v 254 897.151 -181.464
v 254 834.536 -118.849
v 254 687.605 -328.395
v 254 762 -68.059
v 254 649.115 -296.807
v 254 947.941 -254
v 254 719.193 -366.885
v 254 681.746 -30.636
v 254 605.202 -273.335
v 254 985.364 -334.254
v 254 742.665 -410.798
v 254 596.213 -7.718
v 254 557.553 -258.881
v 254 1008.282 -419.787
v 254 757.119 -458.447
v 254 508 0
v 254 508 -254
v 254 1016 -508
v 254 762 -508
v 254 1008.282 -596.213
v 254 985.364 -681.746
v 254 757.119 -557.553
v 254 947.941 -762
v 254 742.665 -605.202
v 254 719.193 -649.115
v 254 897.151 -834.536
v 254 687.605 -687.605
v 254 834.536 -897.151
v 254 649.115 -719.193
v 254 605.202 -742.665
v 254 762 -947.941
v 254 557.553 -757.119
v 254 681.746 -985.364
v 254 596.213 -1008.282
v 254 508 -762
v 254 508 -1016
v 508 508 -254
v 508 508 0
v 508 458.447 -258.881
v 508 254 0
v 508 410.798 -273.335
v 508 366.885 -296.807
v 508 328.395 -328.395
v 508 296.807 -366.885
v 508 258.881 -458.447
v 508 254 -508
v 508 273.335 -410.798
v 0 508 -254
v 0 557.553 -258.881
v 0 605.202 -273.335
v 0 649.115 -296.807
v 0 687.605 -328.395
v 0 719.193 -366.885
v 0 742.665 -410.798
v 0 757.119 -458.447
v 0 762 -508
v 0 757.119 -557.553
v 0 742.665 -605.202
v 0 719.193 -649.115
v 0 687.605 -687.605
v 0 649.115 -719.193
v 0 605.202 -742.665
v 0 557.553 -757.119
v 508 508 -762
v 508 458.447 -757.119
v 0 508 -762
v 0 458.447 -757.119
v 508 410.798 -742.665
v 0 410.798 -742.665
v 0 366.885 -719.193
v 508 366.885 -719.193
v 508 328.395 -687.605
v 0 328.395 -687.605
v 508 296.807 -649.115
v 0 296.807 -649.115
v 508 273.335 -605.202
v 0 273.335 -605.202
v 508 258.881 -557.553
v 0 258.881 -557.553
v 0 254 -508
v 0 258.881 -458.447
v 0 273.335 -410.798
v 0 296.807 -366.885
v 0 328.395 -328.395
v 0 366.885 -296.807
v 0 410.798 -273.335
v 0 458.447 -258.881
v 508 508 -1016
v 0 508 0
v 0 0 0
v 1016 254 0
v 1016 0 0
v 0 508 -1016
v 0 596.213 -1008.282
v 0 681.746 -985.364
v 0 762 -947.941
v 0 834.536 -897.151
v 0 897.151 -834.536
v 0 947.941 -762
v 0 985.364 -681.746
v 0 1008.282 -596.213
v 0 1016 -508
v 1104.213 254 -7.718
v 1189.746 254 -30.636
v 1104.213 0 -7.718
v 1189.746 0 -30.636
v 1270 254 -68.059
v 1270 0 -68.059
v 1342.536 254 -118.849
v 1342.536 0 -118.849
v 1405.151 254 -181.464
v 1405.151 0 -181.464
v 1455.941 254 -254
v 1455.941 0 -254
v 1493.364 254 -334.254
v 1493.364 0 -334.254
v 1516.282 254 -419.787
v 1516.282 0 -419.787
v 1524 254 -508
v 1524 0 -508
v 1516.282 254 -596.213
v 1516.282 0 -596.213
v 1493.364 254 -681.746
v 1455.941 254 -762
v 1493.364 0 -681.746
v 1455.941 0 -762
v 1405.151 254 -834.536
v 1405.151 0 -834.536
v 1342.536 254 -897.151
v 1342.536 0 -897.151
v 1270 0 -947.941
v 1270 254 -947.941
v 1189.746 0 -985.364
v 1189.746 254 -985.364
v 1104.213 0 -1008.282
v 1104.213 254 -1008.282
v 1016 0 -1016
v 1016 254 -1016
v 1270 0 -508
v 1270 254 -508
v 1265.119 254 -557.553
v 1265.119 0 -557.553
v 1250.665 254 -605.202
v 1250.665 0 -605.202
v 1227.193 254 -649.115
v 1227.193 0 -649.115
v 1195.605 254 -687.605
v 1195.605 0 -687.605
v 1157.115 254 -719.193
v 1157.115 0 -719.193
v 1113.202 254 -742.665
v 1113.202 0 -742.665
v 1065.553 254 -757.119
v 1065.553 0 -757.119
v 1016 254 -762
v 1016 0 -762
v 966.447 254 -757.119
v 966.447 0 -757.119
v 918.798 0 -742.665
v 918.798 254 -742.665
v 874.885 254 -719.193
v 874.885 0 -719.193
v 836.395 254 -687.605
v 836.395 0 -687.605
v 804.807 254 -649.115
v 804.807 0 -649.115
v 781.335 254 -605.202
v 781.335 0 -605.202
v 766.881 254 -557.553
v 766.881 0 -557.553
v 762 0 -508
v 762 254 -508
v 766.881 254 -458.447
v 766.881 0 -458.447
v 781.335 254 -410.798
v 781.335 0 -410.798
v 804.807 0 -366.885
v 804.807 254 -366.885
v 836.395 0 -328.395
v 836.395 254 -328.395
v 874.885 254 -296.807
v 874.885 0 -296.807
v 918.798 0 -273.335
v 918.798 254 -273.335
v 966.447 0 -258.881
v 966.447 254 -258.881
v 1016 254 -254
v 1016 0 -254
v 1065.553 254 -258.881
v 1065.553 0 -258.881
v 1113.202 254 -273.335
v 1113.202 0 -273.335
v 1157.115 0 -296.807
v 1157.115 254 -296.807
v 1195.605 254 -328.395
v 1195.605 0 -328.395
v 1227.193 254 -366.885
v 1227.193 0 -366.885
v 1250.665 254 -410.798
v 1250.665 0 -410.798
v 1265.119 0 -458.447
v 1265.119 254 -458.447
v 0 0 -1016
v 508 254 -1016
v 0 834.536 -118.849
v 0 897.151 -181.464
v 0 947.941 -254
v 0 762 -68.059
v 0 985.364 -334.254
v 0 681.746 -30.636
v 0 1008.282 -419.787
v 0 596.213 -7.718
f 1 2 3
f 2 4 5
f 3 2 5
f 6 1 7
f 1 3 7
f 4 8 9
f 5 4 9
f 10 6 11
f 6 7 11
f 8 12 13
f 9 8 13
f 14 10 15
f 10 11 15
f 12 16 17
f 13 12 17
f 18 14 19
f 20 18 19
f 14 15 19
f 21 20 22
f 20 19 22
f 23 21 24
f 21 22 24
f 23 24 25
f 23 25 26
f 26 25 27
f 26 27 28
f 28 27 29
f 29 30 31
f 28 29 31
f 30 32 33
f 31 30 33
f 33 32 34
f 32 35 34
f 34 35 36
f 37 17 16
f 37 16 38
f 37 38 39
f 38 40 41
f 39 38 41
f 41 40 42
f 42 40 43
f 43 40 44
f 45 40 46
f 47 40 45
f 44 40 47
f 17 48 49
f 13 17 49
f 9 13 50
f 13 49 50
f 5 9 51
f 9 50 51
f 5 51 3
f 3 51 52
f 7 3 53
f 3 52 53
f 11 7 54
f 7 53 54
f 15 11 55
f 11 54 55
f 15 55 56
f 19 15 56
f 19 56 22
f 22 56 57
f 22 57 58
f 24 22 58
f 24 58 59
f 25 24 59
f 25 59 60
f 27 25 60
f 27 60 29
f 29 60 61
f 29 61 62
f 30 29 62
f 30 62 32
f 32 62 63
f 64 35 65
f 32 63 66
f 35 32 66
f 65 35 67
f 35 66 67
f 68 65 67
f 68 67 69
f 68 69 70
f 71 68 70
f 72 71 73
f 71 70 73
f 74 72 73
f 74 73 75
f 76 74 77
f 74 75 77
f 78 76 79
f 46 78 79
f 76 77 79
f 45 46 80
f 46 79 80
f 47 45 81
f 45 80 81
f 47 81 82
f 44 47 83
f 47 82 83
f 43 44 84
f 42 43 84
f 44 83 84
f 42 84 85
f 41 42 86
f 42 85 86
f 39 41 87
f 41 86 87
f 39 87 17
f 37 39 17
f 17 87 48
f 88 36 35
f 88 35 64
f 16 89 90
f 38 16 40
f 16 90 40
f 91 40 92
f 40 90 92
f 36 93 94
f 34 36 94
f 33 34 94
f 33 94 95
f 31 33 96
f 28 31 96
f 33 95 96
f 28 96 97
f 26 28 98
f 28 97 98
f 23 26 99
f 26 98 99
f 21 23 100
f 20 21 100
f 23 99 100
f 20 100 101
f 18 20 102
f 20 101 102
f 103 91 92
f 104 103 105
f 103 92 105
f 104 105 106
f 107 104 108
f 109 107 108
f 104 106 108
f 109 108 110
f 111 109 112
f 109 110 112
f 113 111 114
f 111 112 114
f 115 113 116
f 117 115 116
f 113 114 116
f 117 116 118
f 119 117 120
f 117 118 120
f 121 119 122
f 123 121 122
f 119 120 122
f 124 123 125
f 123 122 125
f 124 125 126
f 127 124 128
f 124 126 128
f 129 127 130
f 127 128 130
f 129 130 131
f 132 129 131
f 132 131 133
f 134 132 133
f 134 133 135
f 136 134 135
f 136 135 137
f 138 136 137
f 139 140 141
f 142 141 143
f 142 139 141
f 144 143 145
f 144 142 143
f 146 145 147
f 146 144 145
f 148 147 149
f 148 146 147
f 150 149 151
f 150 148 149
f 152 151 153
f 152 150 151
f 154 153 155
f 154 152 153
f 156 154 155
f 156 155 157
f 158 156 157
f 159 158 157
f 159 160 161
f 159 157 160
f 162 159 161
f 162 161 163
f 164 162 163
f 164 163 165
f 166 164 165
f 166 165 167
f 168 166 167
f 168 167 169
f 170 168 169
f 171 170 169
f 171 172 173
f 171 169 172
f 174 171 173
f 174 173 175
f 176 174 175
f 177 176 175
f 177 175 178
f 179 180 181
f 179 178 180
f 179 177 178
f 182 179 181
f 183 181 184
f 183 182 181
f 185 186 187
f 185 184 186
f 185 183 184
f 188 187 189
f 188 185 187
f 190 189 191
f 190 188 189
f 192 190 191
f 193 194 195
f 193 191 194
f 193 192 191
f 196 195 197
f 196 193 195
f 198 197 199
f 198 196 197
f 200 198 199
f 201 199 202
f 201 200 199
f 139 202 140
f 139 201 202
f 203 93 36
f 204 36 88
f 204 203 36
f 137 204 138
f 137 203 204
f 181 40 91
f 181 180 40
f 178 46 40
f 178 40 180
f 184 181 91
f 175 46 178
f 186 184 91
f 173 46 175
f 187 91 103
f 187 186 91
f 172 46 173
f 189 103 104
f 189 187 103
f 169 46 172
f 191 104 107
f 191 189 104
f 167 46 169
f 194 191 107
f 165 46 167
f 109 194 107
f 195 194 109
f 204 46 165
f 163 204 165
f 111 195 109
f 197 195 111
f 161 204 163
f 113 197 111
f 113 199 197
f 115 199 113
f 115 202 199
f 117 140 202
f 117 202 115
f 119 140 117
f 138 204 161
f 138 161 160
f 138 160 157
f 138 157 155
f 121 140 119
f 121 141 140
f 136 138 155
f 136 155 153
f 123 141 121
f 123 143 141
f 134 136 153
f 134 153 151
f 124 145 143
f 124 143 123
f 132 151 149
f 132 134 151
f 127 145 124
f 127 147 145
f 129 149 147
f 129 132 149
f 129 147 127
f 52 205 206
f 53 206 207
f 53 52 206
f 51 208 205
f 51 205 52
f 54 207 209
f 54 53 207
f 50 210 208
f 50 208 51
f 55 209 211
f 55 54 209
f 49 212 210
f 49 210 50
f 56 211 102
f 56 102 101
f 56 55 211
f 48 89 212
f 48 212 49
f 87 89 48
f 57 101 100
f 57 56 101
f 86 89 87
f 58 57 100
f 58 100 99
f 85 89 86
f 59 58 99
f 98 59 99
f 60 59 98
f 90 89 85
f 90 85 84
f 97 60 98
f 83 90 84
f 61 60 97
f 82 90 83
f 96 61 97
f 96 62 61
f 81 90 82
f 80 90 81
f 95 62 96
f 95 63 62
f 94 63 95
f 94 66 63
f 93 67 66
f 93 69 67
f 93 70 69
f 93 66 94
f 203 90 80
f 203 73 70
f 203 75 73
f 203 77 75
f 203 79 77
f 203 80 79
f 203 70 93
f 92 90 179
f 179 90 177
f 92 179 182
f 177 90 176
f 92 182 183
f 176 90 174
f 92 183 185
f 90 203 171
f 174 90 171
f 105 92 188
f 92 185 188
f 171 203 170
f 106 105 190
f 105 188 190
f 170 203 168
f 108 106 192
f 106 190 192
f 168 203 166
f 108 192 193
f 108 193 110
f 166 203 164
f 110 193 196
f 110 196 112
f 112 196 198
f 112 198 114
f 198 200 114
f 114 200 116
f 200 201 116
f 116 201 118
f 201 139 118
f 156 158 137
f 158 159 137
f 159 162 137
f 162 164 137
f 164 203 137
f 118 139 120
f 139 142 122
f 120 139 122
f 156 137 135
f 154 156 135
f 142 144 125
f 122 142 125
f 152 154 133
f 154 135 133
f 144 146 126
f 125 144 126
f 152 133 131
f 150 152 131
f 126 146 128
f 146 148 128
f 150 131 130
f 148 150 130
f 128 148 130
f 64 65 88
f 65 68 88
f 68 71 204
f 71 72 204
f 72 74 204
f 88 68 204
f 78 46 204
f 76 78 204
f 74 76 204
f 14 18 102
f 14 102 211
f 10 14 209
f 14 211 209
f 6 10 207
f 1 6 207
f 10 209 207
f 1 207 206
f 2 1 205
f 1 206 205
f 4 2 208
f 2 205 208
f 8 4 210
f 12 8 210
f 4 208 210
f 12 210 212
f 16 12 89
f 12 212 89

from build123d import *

# Parameters (mm, degrees)
SKETCH1_R           = 254
BOSS_EXTRUDE1_DEPTH = 254
SKETCH1_3_W         = 254
SKETCH1_3_H         = 1016
BOSS_EXTRUDE2_DEPTH = 508
SKETCH1_4_W         = 254
SKETCH1_4_H         = 1016
BOSS_EXTRUDE3_DEPTH = 1016
SKETCH2_R           = 254
CUT_EXTRUDE2_DEPTH  = 1525
CUT_EXTRUDE3_DEPTH  = 254


with BuildPart() as part:
    # Sketch1 → Boss-Extrude1 (new body)
    with BuildSketch(Plane(origin=(0, 0, 0), x_dir=(1, 0, 0), z_dir=(0, 1, 0))):
        with BuildLine():
            Line((508, 1016), (508, 0))
            Line((508, 0), (1016, 0))
            ThreePointArc((1016, 0), (1524, 508), (1016, 1016))
            Line((1016, 1016), (508, 1016))
        make_face()
        with Locations((1016, 508)):
            Circle(SKETCH1_R, mode=Mode.SUBTRACT)
    extrude(amount=BOSS_EXTRUDE1_DEPTH)

    # Sketch1<3> → Boss-Extrude2 (add)
    with BuildSketch(Plane(origin=(0, 0, 0), x_dir=(1, 0, 0), z_dir=(0, 1, 0))):
        with Locations((381, 508)):
            Rectangle(SKETCH1_3_W, SKETCH1_3_H)
    extrude(amount=BOSS_EXTRUDE2_DEPTH)

    # Sketch1<4> → Boss-Extrude3 (add)
    with BuildSketch(Plane(origin=(0, 0, 0), x_dir=(1, 0, 0), z_dir=(0, 1, 0))):
        with Locations((127, 508)):
            Rectangle(SKETCH1_4_W, SKETCH1_4_H)
    extrude(amount=BOSS_EXTRUDE3_DEPTH)

    # Sketch2 → Cut-Extrude2 (cut, through all)
    with BuildSketch(Plane.ZY):
        with Locations((-508, 508)):
            Circle(SKETCH2_R)
    extrude(amount=-CUT_EXTRUDE2_DEPTH, mode=Mode.SUBTRACT)

    # Sketch2<4> → Cut-Extrude3 (cut)
    with BuildSketch(Plane.ZY):
        with BuildLine():
            ThreePointArc((-508, 1016), (-148.789755157, 867.210244843), (0, 508))
            Line((0, 508), (0, 1016))
            Line((0, 1016), (-508, 1016))
        make_face()
        with BuildLine():
            ThreePointArc((-1016, 508), (-867.210244843, 867.210244843), (-508, 1016))
            Line((-508, 1016), (-1016, 1016))
            Line((-1016, 1016), (-1016, 508))
        make_face()
    extrude(amount=-CUT_EXTRUDE3_DEPTH, mode=Mode.SUBTRACT)


solid = part.part
